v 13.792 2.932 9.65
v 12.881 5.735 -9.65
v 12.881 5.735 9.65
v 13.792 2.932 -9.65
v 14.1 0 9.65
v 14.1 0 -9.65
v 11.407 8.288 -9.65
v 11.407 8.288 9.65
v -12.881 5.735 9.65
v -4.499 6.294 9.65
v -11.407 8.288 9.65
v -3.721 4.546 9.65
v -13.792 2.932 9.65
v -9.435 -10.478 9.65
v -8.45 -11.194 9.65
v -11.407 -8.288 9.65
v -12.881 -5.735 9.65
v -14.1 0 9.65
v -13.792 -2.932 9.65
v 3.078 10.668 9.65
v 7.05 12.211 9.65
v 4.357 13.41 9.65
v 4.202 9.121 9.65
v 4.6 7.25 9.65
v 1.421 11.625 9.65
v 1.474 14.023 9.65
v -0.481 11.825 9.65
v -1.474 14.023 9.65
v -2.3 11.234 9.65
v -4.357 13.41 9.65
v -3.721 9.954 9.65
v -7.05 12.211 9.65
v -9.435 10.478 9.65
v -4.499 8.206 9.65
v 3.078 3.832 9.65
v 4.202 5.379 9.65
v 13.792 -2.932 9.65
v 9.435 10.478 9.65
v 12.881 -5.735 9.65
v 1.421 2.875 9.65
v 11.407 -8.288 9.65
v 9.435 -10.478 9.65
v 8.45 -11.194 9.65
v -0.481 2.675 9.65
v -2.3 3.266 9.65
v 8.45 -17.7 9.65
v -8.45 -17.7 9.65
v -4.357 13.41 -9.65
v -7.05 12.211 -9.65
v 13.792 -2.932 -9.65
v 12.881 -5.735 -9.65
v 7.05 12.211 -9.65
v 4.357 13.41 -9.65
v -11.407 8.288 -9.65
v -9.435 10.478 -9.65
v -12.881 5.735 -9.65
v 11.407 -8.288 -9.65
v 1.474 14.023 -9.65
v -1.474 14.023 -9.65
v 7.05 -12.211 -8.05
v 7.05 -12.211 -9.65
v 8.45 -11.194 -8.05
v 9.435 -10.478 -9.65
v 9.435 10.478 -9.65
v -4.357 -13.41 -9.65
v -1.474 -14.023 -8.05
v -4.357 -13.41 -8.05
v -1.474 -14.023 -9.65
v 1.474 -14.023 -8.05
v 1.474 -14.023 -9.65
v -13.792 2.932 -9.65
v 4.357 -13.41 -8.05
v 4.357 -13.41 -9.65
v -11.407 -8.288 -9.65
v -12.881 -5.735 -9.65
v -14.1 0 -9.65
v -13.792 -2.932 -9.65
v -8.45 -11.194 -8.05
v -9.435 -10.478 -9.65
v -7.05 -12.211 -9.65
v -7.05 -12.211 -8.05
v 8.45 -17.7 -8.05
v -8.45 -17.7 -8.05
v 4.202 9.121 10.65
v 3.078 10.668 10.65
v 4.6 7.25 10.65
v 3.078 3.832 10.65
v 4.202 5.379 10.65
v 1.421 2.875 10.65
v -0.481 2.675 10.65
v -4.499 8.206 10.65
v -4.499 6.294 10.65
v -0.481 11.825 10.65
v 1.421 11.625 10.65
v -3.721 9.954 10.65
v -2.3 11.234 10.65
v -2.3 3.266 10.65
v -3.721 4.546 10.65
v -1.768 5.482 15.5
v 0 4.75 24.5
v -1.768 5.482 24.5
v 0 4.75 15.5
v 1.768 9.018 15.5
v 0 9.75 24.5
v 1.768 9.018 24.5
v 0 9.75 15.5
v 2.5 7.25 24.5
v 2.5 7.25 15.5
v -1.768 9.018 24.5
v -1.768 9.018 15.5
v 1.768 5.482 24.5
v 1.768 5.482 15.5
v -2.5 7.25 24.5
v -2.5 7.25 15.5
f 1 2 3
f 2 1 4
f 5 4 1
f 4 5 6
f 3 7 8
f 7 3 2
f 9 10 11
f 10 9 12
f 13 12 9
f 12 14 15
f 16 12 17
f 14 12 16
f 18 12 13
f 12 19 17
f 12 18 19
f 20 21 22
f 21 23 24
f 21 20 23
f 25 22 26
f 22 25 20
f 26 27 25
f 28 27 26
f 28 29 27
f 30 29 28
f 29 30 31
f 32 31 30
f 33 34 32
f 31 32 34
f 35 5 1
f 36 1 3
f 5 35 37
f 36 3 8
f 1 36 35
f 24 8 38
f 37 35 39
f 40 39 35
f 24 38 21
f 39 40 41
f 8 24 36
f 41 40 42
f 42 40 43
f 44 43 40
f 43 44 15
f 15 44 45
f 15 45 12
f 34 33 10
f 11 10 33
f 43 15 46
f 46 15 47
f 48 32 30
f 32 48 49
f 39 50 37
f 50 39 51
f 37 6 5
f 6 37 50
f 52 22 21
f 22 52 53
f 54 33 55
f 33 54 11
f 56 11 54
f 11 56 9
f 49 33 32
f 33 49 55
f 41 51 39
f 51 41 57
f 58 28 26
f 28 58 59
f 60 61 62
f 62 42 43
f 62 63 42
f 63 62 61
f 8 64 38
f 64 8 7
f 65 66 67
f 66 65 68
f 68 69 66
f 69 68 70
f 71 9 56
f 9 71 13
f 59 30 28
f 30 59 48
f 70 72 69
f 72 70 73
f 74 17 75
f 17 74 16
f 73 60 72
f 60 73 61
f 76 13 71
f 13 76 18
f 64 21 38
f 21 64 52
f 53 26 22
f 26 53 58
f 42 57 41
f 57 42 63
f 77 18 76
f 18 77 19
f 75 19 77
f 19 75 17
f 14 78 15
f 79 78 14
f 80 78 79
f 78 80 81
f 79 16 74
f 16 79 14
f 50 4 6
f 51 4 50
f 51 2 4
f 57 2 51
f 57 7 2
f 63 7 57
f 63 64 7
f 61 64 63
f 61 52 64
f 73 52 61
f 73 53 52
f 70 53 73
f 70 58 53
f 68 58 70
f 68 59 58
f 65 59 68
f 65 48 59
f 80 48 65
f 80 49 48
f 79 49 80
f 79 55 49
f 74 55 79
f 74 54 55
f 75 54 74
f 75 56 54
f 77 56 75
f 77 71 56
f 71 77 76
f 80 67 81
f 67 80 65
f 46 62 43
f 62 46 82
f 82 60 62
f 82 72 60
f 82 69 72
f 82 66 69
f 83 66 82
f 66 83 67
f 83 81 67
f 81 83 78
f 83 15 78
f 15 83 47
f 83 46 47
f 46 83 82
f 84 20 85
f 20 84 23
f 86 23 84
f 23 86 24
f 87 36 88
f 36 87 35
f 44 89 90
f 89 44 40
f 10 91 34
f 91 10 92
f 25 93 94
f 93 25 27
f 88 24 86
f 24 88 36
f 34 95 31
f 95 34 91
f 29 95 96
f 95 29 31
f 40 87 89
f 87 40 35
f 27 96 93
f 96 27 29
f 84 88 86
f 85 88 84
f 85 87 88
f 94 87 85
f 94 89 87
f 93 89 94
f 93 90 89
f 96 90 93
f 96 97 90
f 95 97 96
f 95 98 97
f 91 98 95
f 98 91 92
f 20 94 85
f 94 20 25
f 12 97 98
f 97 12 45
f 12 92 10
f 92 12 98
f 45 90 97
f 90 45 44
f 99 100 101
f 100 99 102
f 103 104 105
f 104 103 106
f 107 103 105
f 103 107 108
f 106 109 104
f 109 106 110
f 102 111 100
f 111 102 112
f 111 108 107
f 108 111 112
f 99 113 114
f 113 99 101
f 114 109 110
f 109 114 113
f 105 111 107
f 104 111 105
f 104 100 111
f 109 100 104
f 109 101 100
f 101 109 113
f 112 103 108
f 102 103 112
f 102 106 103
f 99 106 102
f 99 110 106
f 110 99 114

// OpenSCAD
// Main case part

case_h = 19.3;
case_d = 28.2;
case_r = case_d/2;

cylinder(case_h, case_r, case_r, center=true);

// Wire connector block

wcb_w = 16.9;
wcb_d = 7.2;
wcb_h = 17.7;

translate([0, -case_r, (case_h-wcb_h)/2])
  cube([wcb_w, wcb_d, wcb_h], center=true);

// overhang
oh_h = 1;
oh_d = 9.2;
oh_r = oh_d/2;

oh_shift = 7.25;

translate([0, oh_shift, case_h/2 + oh_h/2])
  cylinder(oh_h, oh_r, oh_r, center = true);

// The shaft

shaft_h = 9;
shaft_d = 5;
shaft_r = shaft_d/2;

#translate([0, oh_shift, 20])
  cylinder(shaft_h, shaft_r, shaft_r, center = true);
